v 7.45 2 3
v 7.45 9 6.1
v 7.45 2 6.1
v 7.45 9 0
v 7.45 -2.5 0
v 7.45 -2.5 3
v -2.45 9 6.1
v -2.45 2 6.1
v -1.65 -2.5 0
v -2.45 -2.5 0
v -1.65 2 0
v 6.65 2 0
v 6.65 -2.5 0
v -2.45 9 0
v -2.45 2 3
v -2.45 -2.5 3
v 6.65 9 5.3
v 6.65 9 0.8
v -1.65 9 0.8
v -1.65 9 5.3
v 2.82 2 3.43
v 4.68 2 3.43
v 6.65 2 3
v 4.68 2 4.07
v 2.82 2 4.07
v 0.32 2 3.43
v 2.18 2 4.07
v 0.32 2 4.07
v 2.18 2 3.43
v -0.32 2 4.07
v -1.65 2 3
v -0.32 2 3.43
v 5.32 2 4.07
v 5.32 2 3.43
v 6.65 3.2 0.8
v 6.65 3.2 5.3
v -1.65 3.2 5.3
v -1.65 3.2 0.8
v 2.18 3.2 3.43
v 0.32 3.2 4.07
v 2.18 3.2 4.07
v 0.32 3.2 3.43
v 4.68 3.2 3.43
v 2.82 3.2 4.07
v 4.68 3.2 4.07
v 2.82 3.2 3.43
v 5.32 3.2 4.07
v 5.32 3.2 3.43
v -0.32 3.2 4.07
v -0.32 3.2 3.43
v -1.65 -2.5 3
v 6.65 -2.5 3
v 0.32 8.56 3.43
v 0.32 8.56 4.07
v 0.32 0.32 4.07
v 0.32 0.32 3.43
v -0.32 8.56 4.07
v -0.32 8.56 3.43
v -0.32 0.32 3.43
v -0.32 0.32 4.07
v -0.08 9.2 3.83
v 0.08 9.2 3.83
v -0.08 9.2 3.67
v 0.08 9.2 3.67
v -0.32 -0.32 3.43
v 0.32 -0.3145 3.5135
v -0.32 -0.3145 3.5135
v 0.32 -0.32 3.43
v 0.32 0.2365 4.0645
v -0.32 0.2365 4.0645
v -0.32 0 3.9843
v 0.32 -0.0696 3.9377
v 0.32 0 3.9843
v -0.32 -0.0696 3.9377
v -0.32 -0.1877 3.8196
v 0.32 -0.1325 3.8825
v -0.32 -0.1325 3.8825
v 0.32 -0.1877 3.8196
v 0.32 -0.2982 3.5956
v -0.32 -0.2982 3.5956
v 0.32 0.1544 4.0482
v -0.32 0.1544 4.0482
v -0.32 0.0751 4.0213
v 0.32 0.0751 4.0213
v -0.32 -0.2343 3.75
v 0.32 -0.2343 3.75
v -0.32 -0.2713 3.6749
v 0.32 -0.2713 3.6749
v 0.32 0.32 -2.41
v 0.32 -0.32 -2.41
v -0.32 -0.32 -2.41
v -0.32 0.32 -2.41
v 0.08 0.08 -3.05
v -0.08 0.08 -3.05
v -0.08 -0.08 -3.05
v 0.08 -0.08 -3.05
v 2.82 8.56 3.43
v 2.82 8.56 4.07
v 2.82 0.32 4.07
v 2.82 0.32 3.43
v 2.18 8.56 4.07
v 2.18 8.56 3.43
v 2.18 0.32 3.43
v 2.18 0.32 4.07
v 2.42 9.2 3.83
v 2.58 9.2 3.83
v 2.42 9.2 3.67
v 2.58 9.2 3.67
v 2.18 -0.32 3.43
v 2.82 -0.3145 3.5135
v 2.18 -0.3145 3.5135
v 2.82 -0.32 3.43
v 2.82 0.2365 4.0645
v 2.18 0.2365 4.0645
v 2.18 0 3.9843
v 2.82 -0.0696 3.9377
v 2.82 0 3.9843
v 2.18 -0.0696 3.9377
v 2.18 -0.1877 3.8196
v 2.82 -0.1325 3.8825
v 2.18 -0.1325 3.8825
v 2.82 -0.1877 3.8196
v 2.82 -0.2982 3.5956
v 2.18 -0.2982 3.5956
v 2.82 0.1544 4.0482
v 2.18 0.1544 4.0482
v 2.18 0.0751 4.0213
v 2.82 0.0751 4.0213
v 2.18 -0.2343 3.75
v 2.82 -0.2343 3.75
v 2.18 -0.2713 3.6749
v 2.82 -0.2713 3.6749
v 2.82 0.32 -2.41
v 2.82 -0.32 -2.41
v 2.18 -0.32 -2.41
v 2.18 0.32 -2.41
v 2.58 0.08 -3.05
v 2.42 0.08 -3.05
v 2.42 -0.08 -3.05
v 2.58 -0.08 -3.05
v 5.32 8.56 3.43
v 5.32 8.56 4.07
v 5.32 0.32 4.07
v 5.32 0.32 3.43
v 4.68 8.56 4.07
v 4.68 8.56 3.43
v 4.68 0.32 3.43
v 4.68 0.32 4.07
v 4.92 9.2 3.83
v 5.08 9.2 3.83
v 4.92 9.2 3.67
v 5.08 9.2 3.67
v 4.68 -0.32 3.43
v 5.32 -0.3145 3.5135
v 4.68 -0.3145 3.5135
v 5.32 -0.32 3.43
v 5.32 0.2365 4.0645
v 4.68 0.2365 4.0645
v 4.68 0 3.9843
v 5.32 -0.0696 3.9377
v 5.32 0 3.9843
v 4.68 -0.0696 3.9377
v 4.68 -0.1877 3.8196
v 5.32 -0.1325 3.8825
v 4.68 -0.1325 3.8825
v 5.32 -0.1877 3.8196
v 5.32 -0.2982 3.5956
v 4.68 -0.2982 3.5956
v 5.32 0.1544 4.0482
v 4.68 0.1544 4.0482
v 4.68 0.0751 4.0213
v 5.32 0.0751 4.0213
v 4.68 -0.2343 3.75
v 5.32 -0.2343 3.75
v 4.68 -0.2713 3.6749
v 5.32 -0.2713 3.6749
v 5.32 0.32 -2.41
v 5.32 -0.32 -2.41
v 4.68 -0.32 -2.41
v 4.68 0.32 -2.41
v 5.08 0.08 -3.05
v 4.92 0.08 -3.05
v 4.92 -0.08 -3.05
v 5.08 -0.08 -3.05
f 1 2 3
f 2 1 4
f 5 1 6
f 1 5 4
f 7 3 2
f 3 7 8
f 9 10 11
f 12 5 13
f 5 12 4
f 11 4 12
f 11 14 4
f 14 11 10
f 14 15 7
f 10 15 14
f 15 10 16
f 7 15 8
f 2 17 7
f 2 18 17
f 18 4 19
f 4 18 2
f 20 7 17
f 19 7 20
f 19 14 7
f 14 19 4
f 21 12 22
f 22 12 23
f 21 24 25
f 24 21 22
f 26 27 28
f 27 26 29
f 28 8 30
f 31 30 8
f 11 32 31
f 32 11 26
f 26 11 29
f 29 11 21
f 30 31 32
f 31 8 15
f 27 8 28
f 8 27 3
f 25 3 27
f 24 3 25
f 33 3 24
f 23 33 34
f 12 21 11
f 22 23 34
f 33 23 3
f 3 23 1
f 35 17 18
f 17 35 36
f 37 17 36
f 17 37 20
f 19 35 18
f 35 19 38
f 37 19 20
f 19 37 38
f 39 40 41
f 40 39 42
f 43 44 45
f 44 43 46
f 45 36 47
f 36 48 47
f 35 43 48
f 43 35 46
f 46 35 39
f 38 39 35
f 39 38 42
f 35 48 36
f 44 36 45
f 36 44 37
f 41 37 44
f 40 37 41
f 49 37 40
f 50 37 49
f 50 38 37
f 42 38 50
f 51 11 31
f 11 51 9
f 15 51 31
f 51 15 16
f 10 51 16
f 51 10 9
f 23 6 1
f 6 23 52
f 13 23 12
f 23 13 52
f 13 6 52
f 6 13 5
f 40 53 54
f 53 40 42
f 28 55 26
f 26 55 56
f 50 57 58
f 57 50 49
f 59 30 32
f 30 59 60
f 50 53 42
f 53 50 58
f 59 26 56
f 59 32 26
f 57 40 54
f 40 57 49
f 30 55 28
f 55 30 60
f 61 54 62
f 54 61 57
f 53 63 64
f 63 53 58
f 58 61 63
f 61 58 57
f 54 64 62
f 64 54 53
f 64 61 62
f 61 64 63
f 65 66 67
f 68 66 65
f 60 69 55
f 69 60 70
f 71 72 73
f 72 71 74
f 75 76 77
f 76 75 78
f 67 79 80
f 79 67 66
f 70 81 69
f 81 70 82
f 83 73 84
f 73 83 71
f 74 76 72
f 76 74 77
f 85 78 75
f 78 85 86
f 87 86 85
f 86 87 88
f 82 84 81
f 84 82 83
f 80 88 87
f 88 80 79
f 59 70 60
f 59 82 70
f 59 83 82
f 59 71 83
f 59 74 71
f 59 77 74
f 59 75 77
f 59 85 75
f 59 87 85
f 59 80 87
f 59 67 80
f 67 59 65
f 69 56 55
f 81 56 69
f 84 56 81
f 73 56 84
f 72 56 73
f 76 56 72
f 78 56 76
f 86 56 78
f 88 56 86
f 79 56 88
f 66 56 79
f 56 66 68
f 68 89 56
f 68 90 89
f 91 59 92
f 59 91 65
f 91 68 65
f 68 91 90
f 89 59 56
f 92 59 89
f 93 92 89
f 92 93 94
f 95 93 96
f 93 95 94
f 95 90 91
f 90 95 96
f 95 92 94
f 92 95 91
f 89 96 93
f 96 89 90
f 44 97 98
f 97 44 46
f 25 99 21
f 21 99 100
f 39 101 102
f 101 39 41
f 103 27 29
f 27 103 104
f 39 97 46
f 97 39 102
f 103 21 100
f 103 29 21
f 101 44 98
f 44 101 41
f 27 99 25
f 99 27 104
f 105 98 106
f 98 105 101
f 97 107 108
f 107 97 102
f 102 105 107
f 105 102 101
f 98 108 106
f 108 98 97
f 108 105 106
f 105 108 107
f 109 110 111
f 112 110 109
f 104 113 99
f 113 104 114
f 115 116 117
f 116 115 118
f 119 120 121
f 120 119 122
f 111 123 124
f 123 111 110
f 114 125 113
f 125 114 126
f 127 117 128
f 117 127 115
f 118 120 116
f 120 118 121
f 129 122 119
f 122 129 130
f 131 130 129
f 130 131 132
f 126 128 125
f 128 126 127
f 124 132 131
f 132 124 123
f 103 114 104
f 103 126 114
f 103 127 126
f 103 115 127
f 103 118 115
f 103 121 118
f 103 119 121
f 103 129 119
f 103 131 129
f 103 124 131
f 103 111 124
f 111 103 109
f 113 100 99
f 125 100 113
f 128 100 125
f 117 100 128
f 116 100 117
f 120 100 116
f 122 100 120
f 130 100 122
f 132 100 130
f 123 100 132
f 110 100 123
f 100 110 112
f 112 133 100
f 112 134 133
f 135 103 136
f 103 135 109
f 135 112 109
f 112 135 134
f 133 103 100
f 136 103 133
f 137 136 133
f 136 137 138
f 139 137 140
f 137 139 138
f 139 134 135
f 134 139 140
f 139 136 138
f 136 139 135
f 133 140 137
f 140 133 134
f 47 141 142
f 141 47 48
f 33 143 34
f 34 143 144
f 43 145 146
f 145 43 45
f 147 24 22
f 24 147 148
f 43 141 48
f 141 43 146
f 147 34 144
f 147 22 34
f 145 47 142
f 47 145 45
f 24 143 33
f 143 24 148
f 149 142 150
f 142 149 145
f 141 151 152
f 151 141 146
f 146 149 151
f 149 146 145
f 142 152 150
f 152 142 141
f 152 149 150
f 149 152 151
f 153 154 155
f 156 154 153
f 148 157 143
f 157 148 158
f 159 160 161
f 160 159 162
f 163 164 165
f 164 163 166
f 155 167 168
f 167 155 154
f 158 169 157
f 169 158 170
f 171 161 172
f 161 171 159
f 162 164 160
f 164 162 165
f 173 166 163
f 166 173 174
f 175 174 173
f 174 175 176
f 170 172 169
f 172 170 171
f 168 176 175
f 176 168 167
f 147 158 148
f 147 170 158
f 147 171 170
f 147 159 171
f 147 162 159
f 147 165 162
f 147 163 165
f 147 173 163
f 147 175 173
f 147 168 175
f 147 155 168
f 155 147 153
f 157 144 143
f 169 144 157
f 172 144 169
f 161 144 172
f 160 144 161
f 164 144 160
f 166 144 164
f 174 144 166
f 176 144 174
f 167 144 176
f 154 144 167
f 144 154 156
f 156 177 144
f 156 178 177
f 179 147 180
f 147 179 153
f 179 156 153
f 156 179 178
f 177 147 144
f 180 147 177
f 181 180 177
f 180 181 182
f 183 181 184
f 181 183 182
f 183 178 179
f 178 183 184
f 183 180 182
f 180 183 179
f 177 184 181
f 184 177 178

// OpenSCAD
module tcube(size){
    translate([0,0,size[2]/2]) cube(size, true);
}

module sq_pyr(w, d, h, ratio){
    resize([w,d,h]) rotate([0,0,45]){
        cylinder(h, d1=1, d2=ratio, $fn=4);
    }
}

module bend(w1, w2){
    rotate([180,0,0]) rotate([0,-90,0]) translate([-w2/2,-w2/2,-w1/2]){
        intersection(){
            rotate_extrude(angle=90, $fn=48) square([w2, w1]);
            cube([w2,w2,w1]);
        }
    }
}
module pin(l, w1, w2){
    echo(w1);
    apex_h = (w1+w2)/2;
    rem_h = l-apex_h;
    translate([0,0,rem_h/2]) cube([w1,w2,rem_h], true);
    translate([0,0,rem_h]) sq_pyr(w1, w2, apex_h, 0.25);
}

module r_pin(l, h, w1, w2){
    l_t = l-w2/2;
    h_t = h-w2/2;
    rotate([-90,0,0]){
        translate([0,0,w2/2]) pin(l_t,w1,w2);
        bend(w1,w2);
    }
    translate([0,0,-w2/2]) rotate([180,0,0]) pin(h_t,w1,w2);
}

render(){
    translate([2.5,5.5,0]){
        difference(){
            tcube([9.9,7.0,6.1]);
            translate([0,0.8,0.8]) tcube([8.3,6.2,4.5]);
        }
        for (i = [-1, 1]){
            translate([i*4.55,-5.75,0]) tcube([0.8,4.5,3]);
        }
    }
    translate([0,0,3.75]){
        for (i = [0,2.5,5]){
            translate([i,0,0]) r_pin(9.2, 6.8, 0.64, 0.64);
        }
    }
}
